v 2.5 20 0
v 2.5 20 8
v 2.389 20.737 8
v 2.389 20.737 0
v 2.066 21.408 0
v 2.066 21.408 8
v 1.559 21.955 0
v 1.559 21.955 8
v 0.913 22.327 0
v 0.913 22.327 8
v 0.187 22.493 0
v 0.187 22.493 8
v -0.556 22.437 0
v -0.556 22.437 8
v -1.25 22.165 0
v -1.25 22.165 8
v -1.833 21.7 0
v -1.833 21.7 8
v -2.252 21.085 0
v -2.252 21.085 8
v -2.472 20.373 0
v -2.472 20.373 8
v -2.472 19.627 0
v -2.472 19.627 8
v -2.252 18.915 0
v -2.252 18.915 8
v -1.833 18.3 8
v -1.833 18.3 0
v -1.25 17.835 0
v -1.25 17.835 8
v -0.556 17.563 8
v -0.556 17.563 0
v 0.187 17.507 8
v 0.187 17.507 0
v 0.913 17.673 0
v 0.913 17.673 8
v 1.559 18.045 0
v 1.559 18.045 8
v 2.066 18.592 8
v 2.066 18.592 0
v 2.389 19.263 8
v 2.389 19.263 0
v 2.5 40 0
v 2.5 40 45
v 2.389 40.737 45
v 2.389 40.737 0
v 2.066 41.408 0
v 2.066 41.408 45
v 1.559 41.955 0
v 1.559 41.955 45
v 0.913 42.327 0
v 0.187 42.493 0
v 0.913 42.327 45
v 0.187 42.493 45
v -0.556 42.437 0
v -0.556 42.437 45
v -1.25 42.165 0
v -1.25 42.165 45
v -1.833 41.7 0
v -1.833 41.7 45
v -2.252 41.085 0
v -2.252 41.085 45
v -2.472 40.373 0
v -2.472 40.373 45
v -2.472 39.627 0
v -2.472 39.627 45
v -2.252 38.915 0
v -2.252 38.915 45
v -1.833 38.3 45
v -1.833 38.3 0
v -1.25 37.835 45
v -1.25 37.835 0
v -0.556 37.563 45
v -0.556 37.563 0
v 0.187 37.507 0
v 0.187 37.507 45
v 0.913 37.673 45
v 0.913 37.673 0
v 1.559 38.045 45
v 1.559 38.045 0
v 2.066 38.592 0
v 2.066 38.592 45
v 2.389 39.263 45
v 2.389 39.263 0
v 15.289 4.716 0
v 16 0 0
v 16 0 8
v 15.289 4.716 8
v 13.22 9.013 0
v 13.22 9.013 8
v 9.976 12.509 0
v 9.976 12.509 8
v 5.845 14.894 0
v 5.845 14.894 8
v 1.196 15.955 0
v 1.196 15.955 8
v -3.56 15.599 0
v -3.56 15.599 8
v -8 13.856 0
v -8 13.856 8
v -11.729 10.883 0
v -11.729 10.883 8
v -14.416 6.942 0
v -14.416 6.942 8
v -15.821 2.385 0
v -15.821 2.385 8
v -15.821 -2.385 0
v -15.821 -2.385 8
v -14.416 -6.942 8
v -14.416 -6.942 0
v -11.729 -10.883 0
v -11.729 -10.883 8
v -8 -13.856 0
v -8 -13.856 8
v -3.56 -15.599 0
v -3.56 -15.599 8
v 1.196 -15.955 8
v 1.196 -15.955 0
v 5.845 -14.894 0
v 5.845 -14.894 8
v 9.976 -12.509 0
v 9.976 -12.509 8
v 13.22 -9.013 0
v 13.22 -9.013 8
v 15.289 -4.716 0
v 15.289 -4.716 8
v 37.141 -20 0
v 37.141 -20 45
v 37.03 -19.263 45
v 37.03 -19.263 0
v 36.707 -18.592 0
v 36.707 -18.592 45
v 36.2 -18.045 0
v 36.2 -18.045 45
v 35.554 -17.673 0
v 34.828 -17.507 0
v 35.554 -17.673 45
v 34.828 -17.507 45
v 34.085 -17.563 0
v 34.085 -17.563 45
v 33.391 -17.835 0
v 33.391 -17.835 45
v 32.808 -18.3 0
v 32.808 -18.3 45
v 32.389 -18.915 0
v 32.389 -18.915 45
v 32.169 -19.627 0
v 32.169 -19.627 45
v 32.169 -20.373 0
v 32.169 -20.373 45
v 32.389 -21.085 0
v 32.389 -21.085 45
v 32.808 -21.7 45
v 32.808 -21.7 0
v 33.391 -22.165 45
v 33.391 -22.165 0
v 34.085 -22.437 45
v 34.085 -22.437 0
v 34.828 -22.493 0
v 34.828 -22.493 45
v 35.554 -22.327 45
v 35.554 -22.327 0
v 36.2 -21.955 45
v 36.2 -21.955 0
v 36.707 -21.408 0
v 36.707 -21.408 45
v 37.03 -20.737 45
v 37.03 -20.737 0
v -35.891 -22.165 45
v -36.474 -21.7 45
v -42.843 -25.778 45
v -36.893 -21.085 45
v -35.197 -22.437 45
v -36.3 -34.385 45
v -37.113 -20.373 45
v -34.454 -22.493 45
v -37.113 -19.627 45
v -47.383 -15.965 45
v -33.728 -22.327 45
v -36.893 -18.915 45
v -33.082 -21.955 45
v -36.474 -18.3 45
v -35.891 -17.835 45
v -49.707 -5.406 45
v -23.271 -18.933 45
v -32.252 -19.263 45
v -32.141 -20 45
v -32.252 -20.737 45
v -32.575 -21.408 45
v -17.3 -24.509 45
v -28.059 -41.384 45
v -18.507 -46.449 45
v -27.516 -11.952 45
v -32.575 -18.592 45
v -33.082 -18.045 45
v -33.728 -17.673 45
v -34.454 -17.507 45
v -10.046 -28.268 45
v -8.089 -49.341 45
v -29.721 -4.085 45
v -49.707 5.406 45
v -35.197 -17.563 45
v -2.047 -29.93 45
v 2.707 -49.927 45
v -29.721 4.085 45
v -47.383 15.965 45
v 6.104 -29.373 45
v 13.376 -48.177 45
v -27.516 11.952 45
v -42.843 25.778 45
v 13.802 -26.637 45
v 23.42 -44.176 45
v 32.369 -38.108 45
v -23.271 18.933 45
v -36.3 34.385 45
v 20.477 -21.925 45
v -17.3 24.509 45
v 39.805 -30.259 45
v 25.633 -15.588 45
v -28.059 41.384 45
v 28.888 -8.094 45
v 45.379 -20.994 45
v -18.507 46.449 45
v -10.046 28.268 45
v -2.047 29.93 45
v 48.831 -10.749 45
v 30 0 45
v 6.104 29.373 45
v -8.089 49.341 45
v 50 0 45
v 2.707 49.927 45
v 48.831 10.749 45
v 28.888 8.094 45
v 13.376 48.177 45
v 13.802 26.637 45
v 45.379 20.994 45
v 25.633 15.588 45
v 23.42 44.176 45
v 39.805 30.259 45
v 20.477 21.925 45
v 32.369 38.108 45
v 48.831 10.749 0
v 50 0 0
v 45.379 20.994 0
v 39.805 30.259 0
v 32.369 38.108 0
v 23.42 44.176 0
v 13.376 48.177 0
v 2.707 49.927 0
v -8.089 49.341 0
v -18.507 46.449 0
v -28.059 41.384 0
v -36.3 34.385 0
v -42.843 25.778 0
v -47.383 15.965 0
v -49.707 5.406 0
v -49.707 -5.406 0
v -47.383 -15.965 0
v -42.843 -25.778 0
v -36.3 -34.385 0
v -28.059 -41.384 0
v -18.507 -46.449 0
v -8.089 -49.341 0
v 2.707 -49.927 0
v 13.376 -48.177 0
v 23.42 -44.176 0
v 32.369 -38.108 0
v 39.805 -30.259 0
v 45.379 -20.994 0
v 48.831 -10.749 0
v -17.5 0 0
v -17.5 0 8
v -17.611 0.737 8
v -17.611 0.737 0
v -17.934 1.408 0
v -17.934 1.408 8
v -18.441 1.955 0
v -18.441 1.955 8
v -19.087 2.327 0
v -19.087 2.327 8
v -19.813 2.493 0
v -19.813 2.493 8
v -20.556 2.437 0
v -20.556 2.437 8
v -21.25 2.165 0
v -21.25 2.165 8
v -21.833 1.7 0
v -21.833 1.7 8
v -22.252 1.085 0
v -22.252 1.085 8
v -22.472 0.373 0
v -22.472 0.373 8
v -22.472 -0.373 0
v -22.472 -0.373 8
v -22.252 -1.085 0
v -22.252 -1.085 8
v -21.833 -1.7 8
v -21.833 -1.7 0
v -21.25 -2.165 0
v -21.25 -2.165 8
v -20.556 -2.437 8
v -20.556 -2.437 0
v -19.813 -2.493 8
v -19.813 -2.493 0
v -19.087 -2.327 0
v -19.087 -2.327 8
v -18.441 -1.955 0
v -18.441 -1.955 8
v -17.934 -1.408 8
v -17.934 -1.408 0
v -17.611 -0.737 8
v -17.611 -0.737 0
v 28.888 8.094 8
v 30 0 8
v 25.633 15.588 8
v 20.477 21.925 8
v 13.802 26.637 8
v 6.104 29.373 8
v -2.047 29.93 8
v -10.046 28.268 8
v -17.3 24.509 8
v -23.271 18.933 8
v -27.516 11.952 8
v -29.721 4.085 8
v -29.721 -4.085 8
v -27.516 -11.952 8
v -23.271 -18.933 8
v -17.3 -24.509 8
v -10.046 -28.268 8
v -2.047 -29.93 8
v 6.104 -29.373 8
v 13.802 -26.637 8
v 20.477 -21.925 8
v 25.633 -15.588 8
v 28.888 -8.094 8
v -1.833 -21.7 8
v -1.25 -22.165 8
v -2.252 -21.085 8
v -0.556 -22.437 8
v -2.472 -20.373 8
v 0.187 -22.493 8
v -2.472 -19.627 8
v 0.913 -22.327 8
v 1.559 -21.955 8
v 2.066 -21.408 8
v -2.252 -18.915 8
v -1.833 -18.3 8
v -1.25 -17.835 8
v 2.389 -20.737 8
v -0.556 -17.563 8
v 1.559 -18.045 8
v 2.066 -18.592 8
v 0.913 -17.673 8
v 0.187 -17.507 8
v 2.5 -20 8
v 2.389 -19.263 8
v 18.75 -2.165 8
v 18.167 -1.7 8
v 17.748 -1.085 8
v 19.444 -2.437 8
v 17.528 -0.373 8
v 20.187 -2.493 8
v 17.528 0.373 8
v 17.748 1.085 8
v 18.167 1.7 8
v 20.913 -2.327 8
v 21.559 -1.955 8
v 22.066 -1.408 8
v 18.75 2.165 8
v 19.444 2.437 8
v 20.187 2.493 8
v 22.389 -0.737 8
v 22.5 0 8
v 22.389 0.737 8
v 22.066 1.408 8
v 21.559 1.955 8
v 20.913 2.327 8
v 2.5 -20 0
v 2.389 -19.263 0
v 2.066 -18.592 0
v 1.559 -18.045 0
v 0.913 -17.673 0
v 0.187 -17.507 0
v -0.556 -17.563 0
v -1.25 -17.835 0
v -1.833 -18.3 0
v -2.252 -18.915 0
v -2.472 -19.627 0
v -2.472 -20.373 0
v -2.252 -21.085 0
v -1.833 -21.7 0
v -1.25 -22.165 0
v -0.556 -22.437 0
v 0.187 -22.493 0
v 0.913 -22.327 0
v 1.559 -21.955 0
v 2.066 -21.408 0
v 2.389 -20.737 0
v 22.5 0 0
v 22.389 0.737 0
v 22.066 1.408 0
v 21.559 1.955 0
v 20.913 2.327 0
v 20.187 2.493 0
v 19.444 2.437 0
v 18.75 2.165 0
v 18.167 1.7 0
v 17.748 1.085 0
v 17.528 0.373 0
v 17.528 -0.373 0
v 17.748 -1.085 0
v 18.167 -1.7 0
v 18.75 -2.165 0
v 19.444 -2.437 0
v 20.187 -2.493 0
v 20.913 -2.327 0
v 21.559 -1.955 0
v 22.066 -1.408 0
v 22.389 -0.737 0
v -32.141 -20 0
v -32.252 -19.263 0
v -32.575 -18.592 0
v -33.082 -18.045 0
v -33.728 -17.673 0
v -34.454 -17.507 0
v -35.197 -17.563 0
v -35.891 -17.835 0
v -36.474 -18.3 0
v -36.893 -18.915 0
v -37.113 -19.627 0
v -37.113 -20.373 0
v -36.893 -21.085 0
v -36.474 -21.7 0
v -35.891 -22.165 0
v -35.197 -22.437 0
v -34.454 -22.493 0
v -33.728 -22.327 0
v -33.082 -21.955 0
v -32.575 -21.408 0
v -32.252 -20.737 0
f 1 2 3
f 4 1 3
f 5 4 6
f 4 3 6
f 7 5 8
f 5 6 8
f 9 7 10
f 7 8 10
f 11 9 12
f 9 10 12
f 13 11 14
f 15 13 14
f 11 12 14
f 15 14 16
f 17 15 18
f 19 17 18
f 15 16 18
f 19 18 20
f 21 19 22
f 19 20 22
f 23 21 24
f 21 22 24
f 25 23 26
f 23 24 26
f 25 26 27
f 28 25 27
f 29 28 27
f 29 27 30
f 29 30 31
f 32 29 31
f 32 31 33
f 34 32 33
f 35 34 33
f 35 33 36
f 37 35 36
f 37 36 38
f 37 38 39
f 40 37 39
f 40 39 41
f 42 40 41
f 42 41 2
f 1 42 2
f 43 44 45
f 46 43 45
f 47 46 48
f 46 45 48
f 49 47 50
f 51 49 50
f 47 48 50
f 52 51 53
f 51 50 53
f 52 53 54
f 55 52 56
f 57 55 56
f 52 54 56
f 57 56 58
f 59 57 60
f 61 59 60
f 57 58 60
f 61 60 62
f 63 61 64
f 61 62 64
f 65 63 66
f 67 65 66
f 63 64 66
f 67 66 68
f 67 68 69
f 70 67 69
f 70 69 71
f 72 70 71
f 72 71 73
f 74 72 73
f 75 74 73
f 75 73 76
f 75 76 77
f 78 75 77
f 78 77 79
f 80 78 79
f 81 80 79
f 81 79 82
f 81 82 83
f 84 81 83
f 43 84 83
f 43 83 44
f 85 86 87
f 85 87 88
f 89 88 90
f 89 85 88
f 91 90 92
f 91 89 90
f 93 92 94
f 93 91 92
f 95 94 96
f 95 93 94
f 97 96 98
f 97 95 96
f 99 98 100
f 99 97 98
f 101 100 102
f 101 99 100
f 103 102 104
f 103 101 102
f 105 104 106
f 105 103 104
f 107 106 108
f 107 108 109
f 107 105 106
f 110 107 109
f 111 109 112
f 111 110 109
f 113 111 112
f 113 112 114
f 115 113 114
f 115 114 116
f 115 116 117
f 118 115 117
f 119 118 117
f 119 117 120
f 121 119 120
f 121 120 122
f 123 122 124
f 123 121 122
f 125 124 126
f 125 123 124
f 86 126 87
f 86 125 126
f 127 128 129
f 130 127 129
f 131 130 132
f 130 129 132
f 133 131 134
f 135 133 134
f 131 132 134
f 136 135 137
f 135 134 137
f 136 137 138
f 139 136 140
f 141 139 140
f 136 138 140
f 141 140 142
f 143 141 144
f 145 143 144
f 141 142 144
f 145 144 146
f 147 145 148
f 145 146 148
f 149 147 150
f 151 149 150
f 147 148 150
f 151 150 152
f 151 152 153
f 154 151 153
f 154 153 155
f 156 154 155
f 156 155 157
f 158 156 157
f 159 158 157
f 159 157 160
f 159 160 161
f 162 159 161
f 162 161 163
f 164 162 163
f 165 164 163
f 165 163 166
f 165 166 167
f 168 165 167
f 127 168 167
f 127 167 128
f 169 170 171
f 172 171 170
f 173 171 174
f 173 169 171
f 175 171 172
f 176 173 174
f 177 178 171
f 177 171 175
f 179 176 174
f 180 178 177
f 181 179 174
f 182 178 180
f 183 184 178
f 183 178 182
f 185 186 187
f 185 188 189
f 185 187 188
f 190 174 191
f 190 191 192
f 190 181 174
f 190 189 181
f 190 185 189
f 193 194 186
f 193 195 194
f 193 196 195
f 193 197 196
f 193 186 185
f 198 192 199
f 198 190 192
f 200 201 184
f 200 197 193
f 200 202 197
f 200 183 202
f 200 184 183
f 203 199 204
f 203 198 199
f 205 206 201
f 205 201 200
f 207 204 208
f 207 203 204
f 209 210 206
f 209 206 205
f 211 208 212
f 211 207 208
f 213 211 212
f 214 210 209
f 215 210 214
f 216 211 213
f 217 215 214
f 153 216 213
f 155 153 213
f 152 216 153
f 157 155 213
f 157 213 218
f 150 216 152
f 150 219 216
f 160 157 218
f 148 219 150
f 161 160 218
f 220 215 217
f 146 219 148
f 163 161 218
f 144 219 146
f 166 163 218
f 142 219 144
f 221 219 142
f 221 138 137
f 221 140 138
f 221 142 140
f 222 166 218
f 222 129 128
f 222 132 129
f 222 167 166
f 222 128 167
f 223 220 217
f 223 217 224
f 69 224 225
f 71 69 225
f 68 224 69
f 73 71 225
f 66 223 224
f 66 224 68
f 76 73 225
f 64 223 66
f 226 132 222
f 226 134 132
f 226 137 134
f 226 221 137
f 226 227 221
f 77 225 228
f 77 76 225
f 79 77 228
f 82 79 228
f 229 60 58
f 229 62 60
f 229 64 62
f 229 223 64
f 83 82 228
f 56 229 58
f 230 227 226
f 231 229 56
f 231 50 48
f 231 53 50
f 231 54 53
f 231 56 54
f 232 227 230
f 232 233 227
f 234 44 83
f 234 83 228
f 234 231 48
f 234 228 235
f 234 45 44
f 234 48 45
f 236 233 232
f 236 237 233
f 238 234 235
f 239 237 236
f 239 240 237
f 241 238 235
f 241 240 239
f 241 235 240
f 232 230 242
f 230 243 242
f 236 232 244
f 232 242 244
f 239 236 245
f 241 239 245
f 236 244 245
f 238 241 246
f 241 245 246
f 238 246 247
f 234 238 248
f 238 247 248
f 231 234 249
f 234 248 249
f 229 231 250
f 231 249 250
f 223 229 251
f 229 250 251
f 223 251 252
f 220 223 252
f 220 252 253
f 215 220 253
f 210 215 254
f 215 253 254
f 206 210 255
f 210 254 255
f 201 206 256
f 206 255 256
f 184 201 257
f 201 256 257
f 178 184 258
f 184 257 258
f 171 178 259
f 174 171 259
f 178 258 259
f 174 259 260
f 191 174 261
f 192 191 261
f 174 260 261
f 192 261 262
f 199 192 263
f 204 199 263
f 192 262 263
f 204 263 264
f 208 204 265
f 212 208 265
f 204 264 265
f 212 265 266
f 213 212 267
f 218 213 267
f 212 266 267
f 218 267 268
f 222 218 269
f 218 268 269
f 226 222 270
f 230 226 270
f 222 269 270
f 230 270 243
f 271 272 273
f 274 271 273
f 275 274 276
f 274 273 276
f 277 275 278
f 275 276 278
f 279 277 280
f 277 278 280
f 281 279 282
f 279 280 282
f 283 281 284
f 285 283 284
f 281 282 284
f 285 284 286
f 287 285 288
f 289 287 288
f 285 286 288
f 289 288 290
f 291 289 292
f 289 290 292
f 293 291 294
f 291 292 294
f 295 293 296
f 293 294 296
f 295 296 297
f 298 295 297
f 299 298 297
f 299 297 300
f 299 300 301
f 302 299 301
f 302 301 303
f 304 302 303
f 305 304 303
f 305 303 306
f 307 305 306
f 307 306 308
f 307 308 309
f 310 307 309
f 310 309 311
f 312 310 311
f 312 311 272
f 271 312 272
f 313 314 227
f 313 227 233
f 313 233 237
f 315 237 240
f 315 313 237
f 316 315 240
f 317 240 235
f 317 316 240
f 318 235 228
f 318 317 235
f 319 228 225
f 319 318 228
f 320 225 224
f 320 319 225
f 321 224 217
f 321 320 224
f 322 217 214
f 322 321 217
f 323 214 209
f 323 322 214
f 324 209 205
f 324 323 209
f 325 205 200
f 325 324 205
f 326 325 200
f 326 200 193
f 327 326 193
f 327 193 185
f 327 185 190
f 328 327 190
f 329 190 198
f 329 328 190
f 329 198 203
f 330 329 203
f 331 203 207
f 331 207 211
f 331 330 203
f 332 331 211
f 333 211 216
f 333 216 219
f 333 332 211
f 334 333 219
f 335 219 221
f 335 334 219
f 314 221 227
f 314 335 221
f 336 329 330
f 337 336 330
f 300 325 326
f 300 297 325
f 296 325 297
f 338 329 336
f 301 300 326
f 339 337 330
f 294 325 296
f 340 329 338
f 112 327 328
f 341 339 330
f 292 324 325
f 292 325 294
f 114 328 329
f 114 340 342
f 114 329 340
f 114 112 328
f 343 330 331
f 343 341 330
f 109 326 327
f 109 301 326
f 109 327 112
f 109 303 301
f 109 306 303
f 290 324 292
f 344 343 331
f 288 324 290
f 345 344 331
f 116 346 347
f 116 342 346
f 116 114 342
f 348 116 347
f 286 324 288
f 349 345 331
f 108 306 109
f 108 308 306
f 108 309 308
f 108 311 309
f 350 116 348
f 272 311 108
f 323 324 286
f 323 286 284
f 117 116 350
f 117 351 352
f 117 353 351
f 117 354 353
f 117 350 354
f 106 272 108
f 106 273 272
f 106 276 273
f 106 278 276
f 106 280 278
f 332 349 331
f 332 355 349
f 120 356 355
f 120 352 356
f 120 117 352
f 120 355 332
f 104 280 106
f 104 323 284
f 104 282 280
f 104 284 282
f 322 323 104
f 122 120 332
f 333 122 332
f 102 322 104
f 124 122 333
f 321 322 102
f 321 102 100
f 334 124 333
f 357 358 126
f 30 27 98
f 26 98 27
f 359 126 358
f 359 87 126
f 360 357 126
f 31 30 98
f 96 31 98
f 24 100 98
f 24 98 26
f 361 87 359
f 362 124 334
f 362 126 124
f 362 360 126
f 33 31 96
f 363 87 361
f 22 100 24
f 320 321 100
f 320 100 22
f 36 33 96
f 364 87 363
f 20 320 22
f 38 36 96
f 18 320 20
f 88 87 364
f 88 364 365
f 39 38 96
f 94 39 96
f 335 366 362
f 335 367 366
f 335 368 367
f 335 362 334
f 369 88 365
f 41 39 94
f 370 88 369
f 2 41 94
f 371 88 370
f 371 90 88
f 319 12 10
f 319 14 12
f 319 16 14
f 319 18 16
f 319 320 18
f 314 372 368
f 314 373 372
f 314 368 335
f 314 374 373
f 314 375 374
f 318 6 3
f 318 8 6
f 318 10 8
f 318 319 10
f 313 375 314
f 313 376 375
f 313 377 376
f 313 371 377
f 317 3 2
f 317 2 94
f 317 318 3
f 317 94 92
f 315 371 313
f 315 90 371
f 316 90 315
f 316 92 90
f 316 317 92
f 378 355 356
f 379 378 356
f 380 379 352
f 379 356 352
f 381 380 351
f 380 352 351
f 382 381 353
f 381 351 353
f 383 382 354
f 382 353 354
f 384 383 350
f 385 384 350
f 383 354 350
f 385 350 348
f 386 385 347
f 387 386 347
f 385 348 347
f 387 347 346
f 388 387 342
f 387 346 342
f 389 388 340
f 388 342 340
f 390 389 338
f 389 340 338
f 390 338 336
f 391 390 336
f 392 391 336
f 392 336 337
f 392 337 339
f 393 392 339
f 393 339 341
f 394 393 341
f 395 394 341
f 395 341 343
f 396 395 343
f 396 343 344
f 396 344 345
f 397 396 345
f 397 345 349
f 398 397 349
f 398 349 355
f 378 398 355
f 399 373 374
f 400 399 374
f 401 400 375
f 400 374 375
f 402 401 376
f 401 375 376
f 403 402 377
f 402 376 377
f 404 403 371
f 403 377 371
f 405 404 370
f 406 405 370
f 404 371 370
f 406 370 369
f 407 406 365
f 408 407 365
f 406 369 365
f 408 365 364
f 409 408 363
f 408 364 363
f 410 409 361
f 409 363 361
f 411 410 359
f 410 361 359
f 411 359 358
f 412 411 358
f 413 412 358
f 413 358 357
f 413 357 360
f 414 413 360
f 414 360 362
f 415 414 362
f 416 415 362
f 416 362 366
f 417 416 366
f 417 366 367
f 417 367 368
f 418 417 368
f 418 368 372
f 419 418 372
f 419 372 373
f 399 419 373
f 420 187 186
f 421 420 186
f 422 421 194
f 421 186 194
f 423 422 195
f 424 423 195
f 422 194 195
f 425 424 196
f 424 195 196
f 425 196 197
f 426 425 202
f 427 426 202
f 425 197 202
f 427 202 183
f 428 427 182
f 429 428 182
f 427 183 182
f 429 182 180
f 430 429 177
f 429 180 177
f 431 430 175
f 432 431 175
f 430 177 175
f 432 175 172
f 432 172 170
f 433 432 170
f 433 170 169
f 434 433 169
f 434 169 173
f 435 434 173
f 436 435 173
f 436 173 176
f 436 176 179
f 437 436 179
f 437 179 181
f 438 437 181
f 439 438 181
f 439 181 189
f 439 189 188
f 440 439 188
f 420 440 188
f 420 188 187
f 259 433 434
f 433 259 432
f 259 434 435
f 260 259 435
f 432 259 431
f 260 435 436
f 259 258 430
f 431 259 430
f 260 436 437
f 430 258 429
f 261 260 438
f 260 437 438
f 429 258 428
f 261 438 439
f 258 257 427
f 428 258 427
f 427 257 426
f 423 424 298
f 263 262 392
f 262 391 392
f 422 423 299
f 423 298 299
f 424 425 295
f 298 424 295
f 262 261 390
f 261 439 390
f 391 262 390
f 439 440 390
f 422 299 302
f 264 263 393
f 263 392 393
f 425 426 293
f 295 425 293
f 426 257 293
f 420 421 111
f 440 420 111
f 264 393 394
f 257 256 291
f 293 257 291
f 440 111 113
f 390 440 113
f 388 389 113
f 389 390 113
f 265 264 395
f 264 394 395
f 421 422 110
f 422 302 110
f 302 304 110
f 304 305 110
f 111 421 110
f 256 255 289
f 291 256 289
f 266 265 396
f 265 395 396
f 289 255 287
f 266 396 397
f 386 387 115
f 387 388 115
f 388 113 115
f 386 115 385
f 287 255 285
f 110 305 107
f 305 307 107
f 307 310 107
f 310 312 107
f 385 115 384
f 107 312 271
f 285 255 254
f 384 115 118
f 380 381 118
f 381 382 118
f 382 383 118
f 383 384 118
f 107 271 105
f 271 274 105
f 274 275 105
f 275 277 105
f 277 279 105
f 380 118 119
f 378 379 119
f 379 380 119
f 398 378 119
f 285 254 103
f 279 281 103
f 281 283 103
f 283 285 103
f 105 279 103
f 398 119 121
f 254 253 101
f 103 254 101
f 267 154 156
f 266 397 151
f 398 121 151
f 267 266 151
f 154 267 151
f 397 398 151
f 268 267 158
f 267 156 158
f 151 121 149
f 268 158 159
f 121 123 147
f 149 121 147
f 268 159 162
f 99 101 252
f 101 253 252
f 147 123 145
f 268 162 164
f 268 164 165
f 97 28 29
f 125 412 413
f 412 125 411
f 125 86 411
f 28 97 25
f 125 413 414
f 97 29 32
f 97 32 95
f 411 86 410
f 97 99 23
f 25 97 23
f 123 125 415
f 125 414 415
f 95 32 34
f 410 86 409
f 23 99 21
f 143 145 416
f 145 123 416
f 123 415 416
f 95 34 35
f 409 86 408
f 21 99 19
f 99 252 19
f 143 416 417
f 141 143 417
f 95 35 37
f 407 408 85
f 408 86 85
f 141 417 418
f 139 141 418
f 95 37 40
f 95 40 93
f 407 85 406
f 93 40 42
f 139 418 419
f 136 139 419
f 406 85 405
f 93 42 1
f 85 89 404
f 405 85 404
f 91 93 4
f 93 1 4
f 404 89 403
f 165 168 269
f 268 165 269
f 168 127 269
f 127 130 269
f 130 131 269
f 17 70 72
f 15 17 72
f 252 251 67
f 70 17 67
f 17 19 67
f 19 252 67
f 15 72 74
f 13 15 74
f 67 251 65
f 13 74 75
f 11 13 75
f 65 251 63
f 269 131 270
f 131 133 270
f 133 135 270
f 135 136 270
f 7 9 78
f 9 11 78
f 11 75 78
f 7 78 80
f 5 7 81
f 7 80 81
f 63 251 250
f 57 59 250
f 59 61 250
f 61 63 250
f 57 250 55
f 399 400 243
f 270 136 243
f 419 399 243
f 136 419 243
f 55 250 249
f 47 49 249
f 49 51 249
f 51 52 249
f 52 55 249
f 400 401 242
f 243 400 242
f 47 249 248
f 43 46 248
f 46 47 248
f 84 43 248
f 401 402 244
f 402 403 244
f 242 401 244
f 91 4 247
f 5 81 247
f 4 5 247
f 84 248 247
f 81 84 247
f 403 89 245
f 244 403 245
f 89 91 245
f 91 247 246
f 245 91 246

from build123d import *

# Parameters (mm, degrees)
SKETCH1_R           = 50
SKETCH1_R_2         = 16
BOSS_EXTRUDE1_DEPTH = 8
SKETCH2_R           = 50
SKETCH2_R_2         = 30
BOSS_EXTRUDE2_DEPTH = 37
SKETCH3_R           = 2.5
CUT_EXTRUDE1_DEPTH  = 46
SKETCH4_R           = 2.5
CUT_EXTRUDE2_DEPTH  = 9


with BuildPart() as part:
    # Sketch1 → Boss-Extrude1 (new body)
    with BuildSketch(Plane.XY):
        Circle(SKETCH1_R)
        Circle(SKETCH1_R_2, mode=Mode.SUBTRACT)
    extrude(amount=BOSS_EXTRUDE1_DEPTH)

    # Sketch2 → Boss-Extrude2 (add)
    with BuildSketch(Plane.XY.offset(8)):
        Circle(SKETCH2_R)
        Circle(SKETCH2_R_2, mode=Mode.SUBTRACT)
    extrude(amount=BOSS_EXTRUDE2_DEPTH)

    # Sketch3 → Cut-Extrude1 (cut, through all)
    with BuildSketch(Plane.XY.offset(45)):
        with Locations((0, 40)):
            Circle(SKETCH3_R)
        with Locations((34.641016151, -20)):
            Circle(SKETCH3_R)
        with Locations((-34.641016151, -20)):
            Circle(SKETCH3_R)
    extrude(amount=-CUT_EXTRUDE1_DEPTH, mode=Mode.SUBTRACT)

    # Sketch4 → Cut-Extrude2 (cut, through all)
    with BuildSketch(Plane.XY.offset(8)):
        with Locations((0, 20)):
            Circle(SKETCH4_R)
        with Locations((20, 0)):
            Circle(SKETCH4_R)
        with Locations((0, -20)):
            Circle(SKETCH4_R)
        with Locations((-20, 0)):
            Circle(SKETCH4_R)
    extrude(amount=-CUT_EXTRUDE2_DEPTH, mode=Mode.SUBTRACT)


solid = part.part
